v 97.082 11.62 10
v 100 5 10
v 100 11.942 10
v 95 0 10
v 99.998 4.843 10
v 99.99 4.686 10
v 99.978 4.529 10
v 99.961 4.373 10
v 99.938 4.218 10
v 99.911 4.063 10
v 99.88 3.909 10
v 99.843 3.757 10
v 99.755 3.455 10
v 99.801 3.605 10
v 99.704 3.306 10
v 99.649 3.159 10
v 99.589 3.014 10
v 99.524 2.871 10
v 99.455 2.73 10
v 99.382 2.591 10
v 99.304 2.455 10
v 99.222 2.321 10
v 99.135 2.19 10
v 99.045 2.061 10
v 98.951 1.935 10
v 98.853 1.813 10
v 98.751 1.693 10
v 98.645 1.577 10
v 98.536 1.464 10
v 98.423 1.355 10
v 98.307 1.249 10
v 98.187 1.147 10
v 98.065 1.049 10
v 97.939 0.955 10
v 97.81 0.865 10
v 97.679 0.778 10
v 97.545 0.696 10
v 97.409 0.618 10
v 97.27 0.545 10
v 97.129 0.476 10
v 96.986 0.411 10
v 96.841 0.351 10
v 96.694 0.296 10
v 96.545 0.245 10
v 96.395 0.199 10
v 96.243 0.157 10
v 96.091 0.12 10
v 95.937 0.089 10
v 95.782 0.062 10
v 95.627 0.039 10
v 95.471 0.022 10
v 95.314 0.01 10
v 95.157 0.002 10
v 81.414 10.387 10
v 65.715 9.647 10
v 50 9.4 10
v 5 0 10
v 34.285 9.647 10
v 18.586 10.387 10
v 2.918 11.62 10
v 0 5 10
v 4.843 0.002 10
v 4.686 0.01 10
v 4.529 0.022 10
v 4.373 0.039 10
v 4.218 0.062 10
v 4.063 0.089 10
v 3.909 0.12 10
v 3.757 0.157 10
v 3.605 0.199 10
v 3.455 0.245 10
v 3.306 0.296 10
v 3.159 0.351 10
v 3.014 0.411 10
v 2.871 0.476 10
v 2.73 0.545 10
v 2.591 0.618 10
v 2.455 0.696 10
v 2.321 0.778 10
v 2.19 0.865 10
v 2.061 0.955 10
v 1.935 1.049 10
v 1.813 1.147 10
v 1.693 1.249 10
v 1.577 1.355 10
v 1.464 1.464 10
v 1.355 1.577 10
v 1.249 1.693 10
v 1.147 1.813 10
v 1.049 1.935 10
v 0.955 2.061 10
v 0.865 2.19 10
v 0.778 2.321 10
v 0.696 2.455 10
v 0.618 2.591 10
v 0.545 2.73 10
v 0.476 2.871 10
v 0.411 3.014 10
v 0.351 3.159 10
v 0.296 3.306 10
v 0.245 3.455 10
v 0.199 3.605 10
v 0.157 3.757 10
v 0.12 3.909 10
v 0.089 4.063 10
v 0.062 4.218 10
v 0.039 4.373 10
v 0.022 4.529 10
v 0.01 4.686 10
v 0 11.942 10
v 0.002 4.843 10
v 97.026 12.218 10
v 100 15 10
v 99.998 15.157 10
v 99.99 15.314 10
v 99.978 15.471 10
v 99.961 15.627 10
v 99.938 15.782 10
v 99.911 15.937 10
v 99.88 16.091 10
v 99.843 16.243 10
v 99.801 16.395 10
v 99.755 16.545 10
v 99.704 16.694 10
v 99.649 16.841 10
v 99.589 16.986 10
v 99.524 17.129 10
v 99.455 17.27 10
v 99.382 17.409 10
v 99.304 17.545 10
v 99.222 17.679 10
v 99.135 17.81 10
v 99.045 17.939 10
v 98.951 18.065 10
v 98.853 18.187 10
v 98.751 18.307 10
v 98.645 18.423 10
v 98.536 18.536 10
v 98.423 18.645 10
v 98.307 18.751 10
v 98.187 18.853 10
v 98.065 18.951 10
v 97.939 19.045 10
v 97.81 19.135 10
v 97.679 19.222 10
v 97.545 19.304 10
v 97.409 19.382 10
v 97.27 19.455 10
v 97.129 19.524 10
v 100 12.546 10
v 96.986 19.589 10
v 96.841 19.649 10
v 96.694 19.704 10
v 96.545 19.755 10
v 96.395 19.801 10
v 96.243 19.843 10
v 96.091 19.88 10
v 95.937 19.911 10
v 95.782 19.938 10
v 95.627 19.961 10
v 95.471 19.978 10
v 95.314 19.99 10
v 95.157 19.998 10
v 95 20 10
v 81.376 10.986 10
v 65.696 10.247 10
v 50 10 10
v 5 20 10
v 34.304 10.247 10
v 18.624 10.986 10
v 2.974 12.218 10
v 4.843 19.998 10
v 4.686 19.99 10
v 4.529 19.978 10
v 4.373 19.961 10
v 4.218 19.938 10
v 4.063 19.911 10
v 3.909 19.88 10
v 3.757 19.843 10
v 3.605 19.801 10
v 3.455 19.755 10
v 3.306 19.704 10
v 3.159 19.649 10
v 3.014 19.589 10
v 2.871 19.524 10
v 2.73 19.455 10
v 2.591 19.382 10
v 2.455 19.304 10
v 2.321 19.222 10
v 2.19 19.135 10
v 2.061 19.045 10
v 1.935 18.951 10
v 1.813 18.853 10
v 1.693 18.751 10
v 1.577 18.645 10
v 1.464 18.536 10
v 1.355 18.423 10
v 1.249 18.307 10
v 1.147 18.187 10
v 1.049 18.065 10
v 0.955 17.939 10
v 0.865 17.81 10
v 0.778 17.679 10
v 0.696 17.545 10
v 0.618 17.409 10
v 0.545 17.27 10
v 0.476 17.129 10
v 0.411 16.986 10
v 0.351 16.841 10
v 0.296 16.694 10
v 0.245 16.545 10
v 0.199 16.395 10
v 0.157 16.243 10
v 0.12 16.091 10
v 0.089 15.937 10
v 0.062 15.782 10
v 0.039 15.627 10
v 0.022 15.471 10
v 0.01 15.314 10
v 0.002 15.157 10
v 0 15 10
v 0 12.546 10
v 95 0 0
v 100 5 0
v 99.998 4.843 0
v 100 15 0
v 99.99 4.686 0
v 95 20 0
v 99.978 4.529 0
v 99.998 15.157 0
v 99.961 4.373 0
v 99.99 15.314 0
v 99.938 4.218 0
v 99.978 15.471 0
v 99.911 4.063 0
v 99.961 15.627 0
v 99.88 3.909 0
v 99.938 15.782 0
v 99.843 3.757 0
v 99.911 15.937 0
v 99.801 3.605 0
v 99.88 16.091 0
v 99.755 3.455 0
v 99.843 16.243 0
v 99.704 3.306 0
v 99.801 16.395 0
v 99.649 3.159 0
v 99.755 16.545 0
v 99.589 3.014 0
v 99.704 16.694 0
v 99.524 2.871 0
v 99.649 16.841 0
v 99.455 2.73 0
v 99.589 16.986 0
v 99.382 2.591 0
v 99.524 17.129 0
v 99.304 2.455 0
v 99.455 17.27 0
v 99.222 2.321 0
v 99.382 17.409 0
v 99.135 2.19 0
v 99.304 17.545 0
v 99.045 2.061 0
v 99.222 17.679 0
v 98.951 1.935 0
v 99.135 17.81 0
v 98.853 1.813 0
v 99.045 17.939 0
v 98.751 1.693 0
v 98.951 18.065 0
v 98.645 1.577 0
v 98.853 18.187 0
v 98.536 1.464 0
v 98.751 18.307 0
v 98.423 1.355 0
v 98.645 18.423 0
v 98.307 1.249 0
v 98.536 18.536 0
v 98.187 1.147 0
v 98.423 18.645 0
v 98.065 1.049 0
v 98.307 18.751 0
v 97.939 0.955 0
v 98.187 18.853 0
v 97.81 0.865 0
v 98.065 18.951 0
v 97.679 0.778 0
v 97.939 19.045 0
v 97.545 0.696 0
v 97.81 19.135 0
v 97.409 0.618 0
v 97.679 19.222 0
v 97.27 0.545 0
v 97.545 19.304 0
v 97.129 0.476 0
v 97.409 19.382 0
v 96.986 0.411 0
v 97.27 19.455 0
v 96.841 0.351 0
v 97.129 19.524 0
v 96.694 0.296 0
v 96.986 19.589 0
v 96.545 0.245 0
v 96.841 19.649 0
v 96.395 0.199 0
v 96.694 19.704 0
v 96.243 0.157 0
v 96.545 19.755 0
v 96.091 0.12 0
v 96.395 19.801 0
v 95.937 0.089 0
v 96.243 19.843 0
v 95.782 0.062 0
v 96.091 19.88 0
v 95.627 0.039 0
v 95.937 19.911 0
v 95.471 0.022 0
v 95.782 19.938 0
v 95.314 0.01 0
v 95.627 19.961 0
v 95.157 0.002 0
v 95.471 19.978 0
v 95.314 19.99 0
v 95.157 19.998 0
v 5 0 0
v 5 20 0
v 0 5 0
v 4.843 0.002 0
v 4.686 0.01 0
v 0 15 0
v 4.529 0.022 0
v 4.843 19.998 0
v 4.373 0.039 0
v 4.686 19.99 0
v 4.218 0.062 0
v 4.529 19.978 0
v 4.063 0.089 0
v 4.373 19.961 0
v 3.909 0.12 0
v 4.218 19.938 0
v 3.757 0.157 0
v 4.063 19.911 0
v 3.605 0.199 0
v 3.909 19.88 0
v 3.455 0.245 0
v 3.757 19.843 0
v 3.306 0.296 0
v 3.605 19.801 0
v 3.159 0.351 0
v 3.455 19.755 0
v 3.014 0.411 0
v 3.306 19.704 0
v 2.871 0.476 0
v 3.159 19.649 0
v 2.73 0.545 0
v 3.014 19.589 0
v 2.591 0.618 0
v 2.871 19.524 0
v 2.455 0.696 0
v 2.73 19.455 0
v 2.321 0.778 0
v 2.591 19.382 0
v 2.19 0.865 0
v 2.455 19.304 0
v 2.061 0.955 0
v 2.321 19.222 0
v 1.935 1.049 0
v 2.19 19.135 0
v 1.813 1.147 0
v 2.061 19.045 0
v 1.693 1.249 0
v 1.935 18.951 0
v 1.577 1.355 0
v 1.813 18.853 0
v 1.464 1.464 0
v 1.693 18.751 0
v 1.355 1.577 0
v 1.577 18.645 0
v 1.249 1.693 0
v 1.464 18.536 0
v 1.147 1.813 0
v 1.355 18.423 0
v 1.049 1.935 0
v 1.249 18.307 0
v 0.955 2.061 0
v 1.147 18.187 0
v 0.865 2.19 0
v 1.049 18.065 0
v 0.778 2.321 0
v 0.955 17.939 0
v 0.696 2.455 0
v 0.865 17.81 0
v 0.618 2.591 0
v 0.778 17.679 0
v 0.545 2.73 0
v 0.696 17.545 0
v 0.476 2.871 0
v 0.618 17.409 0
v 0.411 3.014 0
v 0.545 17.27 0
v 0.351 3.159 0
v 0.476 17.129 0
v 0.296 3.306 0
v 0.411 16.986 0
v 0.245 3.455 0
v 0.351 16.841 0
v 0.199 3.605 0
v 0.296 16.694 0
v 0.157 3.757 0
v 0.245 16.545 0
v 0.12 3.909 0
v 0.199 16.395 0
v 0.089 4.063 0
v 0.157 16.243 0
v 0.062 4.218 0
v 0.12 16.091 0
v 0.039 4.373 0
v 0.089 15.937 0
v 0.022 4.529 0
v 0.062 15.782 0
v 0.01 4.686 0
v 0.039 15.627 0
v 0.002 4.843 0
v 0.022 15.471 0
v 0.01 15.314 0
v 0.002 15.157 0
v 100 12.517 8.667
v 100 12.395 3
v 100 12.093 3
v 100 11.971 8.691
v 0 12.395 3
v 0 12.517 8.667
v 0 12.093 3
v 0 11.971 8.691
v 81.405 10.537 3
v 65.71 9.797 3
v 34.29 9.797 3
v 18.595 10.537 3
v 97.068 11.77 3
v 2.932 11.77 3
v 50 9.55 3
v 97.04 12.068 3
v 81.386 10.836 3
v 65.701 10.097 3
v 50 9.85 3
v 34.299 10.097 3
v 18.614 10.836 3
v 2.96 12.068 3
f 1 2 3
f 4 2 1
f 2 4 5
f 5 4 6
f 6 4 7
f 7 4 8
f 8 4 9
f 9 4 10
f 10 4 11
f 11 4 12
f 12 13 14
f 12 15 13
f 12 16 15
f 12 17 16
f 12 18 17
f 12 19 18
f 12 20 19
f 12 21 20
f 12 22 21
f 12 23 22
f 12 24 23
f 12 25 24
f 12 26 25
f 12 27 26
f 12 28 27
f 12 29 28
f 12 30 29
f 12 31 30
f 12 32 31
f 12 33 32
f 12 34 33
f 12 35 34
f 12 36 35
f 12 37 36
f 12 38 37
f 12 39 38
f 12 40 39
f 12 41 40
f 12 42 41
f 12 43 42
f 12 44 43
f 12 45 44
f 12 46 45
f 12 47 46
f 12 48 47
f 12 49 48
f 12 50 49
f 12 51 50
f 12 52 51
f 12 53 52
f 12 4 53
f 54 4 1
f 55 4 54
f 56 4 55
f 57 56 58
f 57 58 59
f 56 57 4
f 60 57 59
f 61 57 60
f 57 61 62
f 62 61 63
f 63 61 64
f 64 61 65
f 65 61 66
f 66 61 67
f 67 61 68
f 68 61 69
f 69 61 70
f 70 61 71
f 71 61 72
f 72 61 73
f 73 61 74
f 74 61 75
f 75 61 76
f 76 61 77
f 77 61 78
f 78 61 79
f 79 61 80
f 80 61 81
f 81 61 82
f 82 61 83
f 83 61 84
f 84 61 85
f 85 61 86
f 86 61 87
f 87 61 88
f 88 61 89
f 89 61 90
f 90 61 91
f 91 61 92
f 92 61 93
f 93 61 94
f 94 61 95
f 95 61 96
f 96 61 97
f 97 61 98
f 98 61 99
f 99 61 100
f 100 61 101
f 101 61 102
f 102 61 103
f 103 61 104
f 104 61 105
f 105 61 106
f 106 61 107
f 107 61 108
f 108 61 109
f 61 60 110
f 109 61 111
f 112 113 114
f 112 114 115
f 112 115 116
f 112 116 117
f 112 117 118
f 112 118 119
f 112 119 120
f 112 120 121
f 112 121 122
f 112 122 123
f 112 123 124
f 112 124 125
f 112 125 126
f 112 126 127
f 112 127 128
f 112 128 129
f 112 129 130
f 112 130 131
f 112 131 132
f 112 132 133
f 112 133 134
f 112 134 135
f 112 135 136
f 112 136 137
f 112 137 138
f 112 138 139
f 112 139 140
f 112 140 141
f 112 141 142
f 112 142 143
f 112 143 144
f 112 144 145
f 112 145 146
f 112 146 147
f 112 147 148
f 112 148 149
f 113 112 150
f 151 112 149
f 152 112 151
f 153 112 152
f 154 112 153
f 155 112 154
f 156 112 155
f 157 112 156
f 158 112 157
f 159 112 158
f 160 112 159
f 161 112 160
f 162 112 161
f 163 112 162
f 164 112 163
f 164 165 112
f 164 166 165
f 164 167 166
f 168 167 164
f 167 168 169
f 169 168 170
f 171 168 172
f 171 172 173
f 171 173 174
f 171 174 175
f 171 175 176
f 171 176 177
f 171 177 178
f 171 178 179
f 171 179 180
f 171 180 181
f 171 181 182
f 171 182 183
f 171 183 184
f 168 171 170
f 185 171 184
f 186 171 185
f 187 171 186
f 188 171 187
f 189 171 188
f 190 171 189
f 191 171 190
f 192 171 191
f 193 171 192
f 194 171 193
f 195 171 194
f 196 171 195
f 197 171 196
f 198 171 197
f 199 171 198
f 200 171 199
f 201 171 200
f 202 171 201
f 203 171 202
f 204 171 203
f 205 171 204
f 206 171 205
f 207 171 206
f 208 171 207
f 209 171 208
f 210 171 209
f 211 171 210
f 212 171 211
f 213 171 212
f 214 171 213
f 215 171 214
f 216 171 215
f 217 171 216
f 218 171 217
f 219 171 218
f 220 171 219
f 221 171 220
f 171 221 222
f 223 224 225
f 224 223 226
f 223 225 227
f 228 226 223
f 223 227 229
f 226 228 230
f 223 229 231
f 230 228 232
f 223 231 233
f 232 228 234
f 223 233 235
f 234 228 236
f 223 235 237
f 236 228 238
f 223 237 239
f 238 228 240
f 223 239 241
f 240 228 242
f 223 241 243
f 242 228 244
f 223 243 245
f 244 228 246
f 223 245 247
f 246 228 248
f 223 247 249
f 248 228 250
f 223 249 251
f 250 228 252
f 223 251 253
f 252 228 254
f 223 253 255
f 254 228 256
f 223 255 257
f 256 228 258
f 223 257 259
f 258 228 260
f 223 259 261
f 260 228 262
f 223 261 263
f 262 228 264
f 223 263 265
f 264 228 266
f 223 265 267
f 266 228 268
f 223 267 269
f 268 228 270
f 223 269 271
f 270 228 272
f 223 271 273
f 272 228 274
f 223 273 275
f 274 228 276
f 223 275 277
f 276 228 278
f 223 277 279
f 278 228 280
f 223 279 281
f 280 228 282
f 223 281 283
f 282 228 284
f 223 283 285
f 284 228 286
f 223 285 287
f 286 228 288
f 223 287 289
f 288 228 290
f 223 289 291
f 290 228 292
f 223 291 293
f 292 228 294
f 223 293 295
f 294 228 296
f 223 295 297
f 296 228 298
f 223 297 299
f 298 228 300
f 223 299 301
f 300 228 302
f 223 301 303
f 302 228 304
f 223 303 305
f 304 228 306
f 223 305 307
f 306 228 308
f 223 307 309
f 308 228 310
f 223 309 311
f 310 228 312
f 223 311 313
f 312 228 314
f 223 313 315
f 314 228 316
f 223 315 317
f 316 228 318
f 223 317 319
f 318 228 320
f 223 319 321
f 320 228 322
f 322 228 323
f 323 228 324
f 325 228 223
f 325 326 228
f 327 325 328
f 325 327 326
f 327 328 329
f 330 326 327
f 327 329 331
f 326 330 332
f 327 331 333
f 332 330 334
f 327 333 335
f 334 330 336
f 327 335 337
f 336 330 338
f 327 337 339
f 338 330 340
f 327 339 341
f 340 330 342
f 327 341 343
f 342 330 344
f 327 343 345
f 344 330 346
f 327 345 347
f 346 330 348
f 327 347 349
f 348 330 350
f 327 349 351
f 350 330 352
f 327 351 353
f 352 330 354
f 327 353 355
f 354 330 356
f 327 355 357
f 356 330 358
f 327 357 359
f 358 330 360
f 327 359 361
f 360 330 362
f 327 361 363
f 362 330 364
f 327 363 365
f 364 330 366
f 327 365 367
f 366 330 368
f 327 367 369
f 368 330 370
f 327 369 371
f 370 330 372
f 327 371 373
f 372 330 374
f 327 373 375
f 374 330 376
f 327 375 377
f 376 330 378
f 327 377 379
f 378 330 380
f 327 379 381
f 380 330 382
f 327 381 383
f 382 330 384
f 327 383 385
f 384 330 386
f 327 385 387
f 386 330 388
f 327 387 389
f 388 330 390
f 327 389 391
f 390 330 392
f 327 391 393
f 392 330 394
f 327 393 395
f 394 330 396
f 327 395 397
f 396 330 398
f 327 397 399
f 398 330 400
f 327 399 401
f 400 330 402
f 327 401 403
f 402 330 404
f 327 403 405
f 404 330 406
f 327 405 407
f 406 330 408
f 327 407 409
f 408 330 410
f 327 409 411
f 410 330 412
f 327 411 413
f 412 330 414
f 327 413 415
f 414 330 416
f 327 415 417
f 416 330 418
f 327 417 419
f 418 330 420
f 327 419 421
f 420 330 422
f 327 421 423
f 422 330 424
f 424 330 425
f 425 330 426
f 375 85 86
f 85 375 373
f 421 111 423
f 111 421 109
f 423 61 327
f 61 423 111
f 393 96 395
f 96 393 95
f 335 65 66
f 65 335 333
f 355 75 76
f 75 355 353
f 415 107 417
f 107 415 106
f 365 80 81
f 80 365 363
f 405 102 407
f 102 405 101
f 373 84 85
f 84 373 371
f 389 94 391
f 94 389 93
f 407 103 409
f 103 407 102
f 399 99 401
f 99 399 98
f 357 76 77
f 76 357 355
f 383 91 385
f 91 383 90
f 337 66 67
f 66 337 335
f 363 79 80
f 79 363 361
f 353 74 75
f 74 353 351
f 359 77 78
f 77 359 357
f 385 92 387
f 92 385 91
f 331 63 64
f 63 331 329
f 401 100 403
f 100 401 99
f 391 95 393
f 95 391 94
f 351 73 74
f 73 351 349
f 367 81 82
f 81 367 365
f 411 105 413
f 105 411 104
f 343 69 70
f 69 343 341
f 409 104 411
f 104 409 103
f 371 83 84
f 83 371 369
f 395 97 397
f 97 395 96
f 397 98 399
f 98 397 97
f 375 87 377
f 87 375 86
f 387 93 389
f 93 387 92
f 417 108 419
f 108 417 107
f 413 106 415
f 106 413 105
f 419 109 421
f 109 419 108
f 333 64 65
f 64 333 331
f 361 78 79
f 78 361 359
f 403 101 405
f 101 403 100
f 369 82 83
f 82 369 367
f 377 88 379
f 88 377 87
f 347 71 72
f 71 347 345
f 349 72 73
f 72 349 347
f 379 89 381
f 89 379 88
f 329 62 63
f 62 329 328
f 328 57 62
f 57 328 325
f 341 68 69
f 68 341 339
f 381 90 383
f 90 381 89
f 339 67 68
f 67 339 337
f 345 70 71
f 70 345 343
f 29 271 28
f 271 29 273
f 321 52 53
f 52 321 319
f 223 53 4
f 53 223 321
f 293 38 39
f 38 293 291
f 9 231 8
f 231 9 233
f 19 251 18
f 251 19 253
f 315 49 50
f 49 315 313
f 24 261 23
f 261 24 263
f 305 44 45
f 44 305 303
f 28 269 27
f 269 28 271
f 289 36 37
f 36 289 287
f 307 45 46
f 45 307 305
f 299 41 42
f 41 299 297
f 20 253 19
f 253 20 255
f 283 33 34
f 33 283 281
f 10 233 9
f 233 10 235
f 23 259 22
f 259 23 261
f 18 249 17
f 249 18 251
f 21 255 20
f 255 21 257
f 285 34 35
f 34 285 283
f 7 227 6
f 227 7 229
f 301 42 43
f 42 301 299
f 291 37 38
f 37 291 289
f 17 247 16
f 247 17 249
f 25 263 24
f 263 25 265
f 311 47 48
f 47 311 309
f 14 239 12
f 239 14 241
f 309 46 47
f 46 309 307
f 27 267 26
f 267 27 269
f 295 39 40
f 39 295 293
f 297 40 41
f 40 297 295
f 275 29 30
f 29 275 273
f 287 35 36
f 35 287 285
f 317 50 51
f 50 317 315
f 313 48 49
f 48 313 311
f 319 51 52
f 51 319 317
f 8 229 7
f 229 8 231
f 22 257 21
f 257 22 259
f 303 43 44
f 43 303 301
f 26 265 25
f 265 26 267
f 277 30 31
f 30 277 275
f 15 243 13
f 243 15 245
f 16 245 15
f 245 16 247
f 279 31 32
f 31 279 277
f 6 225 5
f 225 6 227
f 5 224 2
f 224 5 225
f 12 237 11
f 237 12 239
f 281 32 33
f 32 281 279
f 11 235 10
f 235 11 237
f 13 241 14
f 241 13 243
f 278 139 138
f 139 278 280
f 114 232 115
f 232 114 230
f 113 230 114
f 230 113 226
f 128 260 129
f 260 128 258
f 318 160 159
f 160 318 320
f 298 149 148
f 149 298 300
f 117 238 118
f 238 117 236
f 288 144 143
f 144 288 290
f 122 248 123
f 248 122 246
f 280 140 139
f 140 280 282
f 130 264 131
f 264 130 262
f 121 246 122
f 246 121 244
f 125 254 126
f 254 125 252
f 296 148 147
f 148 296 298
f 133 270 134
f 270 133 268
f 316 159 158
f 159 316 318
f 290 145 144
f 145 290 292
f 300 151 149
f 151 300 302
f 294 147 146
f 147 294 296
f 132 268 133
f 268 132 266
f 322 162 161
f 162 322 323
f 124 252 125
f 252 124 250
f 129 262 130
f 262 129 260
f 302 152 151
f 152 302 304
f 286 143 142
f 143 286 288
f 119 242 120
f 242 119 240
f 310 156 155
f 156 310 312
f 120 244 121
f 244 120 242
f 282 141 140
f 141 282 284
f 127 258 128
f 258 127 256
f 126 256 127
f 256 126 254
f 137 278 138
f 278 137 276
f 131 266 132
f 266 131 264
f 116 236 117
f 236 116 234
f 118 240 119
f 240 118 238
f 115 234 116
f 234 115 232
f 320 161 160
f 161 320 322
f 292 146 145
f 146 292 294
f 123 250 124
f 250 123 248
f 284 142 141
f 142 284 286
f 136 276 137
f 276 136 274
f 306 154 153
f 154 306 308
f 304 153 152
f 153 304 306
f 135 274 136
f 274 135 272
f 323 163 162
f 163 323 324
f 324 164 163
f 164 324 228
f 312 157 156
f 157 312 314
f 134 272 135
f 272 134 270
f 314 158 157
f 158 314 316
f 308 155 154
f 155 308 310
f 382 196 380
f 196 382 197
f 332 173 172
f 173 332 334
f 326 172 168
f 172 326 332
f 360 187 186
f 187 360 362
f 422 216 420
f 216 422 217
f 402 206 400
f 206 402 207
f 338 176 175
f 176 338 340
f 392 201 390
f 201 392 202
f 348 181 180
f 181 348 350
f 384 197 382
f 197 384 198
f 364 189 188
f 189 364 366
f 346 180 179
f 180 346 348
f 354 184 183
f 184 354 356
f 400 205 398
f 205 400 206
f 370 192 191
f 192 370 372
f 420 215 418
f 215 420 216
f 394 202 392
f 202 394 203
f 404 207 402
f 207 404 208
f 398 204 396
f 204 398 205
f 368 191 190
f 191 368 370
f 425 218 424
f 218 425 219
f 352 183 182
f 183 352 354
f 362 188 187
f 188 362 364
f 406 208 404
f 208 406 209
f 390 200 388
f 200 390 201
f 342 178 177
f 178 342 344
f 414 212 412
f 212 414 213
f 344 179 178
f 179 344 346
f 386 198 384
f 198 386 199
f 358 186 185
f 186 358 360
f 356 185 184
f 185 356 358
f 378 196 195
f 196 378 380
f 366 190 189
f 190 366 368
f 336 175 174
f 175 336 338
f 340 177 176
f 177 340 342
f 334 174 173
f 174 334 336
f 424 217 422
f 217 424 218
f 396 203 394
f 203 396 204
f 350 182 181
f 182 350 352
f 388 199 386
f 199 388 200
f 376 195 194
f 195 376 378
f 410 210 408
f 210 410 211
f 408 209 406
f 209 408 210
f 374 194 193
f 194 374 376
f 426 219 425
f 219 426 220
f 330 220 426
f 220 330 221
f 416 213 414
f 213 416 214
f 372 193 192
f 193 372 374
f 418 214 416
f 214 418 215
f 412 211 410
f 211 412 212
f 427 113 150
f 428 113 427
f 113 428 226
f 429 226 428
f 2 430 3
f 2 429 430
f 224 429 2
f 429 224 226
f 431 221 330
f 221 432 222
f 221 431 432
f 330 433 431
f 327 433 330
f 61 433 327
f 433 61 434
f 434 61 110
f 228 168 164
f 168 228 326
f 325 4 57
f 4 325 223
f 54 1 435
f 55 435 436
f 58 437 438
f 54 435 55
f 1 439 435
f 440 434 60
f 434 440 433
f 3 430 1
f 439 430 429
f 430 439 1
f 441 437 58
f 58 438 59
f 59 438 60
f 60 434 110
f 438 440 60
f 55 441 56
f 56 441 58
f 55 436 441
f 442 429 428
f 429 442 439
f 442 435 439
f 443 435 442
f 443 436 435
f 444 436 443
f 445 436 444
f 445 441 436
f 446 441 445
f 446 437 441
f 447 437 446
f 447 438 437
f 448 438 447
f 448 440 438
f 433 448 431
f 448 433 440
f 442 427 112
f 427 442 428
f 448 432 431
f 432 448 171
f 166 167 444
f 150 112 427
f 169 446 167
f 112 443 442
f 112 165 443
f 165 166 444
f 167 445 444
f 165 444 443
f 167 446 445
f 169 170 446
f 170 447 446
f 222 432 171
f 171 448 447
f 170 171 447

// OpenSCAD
// file: simple_rounded_cube.scad
module sr_cube(size=[1,1,1],radius=0.5,corners=[1,1,1,1]) {
    difference(){    
    cube(size);
    
        if(corners[0])
        translate([radius,radius,0])rotate([0,0,180])difference(){
                cube([radius*2,radius*2,size[2]]);
                cylinder(size[2],radius,radius);
        }
        if(corners[1])
        translate([size[0]-radius,radius,0])rotate([0,0,270])difference(){
                cube([radius*2,radius*2,size[2]]);
                cylinder(size[2],radius,radius);
        }
        if(corners[2])
        translate([size[0]-radius,size[1]-radius,0])rotate([0,0,0])difference(){
                cube([radius*2,radius*2,size[2]]);
                cylinder(size[2],radius,radius);
        }
        if(corners[3])
        translate([radius,size[1]-radius,0])rotate([0,0,90])difference(){
                cube([radius*2,radius*2,size[2]]);
                cylinder(size[2],radius,radius);
        }
        }
        
}


//sr_cube([20,20,5], radius=4,corners=[0,0,0,0]);
// main file
include <simple_rounded_cube.scad>

$fn = 200;

//length
l = 100;
//width
w = 20;
//height
h = 10;
//border radius
br = 5;

//cut depth
cd = h-3;
//cut radius
cr = 500;
//cut width
cw = 0.6;
//cut width lower
cwl = 0.3;

difference() {
sr_cube([l,w,h],br);
    
    translate([l/2,cr+w/2-cw/2,h-cd])
        difference() {
            cylinder(cd,cr+cwl/2,cr+cw/2);
            cylinder(cd,cr-cwl/2,cr-cw/2);
            
        }
}
